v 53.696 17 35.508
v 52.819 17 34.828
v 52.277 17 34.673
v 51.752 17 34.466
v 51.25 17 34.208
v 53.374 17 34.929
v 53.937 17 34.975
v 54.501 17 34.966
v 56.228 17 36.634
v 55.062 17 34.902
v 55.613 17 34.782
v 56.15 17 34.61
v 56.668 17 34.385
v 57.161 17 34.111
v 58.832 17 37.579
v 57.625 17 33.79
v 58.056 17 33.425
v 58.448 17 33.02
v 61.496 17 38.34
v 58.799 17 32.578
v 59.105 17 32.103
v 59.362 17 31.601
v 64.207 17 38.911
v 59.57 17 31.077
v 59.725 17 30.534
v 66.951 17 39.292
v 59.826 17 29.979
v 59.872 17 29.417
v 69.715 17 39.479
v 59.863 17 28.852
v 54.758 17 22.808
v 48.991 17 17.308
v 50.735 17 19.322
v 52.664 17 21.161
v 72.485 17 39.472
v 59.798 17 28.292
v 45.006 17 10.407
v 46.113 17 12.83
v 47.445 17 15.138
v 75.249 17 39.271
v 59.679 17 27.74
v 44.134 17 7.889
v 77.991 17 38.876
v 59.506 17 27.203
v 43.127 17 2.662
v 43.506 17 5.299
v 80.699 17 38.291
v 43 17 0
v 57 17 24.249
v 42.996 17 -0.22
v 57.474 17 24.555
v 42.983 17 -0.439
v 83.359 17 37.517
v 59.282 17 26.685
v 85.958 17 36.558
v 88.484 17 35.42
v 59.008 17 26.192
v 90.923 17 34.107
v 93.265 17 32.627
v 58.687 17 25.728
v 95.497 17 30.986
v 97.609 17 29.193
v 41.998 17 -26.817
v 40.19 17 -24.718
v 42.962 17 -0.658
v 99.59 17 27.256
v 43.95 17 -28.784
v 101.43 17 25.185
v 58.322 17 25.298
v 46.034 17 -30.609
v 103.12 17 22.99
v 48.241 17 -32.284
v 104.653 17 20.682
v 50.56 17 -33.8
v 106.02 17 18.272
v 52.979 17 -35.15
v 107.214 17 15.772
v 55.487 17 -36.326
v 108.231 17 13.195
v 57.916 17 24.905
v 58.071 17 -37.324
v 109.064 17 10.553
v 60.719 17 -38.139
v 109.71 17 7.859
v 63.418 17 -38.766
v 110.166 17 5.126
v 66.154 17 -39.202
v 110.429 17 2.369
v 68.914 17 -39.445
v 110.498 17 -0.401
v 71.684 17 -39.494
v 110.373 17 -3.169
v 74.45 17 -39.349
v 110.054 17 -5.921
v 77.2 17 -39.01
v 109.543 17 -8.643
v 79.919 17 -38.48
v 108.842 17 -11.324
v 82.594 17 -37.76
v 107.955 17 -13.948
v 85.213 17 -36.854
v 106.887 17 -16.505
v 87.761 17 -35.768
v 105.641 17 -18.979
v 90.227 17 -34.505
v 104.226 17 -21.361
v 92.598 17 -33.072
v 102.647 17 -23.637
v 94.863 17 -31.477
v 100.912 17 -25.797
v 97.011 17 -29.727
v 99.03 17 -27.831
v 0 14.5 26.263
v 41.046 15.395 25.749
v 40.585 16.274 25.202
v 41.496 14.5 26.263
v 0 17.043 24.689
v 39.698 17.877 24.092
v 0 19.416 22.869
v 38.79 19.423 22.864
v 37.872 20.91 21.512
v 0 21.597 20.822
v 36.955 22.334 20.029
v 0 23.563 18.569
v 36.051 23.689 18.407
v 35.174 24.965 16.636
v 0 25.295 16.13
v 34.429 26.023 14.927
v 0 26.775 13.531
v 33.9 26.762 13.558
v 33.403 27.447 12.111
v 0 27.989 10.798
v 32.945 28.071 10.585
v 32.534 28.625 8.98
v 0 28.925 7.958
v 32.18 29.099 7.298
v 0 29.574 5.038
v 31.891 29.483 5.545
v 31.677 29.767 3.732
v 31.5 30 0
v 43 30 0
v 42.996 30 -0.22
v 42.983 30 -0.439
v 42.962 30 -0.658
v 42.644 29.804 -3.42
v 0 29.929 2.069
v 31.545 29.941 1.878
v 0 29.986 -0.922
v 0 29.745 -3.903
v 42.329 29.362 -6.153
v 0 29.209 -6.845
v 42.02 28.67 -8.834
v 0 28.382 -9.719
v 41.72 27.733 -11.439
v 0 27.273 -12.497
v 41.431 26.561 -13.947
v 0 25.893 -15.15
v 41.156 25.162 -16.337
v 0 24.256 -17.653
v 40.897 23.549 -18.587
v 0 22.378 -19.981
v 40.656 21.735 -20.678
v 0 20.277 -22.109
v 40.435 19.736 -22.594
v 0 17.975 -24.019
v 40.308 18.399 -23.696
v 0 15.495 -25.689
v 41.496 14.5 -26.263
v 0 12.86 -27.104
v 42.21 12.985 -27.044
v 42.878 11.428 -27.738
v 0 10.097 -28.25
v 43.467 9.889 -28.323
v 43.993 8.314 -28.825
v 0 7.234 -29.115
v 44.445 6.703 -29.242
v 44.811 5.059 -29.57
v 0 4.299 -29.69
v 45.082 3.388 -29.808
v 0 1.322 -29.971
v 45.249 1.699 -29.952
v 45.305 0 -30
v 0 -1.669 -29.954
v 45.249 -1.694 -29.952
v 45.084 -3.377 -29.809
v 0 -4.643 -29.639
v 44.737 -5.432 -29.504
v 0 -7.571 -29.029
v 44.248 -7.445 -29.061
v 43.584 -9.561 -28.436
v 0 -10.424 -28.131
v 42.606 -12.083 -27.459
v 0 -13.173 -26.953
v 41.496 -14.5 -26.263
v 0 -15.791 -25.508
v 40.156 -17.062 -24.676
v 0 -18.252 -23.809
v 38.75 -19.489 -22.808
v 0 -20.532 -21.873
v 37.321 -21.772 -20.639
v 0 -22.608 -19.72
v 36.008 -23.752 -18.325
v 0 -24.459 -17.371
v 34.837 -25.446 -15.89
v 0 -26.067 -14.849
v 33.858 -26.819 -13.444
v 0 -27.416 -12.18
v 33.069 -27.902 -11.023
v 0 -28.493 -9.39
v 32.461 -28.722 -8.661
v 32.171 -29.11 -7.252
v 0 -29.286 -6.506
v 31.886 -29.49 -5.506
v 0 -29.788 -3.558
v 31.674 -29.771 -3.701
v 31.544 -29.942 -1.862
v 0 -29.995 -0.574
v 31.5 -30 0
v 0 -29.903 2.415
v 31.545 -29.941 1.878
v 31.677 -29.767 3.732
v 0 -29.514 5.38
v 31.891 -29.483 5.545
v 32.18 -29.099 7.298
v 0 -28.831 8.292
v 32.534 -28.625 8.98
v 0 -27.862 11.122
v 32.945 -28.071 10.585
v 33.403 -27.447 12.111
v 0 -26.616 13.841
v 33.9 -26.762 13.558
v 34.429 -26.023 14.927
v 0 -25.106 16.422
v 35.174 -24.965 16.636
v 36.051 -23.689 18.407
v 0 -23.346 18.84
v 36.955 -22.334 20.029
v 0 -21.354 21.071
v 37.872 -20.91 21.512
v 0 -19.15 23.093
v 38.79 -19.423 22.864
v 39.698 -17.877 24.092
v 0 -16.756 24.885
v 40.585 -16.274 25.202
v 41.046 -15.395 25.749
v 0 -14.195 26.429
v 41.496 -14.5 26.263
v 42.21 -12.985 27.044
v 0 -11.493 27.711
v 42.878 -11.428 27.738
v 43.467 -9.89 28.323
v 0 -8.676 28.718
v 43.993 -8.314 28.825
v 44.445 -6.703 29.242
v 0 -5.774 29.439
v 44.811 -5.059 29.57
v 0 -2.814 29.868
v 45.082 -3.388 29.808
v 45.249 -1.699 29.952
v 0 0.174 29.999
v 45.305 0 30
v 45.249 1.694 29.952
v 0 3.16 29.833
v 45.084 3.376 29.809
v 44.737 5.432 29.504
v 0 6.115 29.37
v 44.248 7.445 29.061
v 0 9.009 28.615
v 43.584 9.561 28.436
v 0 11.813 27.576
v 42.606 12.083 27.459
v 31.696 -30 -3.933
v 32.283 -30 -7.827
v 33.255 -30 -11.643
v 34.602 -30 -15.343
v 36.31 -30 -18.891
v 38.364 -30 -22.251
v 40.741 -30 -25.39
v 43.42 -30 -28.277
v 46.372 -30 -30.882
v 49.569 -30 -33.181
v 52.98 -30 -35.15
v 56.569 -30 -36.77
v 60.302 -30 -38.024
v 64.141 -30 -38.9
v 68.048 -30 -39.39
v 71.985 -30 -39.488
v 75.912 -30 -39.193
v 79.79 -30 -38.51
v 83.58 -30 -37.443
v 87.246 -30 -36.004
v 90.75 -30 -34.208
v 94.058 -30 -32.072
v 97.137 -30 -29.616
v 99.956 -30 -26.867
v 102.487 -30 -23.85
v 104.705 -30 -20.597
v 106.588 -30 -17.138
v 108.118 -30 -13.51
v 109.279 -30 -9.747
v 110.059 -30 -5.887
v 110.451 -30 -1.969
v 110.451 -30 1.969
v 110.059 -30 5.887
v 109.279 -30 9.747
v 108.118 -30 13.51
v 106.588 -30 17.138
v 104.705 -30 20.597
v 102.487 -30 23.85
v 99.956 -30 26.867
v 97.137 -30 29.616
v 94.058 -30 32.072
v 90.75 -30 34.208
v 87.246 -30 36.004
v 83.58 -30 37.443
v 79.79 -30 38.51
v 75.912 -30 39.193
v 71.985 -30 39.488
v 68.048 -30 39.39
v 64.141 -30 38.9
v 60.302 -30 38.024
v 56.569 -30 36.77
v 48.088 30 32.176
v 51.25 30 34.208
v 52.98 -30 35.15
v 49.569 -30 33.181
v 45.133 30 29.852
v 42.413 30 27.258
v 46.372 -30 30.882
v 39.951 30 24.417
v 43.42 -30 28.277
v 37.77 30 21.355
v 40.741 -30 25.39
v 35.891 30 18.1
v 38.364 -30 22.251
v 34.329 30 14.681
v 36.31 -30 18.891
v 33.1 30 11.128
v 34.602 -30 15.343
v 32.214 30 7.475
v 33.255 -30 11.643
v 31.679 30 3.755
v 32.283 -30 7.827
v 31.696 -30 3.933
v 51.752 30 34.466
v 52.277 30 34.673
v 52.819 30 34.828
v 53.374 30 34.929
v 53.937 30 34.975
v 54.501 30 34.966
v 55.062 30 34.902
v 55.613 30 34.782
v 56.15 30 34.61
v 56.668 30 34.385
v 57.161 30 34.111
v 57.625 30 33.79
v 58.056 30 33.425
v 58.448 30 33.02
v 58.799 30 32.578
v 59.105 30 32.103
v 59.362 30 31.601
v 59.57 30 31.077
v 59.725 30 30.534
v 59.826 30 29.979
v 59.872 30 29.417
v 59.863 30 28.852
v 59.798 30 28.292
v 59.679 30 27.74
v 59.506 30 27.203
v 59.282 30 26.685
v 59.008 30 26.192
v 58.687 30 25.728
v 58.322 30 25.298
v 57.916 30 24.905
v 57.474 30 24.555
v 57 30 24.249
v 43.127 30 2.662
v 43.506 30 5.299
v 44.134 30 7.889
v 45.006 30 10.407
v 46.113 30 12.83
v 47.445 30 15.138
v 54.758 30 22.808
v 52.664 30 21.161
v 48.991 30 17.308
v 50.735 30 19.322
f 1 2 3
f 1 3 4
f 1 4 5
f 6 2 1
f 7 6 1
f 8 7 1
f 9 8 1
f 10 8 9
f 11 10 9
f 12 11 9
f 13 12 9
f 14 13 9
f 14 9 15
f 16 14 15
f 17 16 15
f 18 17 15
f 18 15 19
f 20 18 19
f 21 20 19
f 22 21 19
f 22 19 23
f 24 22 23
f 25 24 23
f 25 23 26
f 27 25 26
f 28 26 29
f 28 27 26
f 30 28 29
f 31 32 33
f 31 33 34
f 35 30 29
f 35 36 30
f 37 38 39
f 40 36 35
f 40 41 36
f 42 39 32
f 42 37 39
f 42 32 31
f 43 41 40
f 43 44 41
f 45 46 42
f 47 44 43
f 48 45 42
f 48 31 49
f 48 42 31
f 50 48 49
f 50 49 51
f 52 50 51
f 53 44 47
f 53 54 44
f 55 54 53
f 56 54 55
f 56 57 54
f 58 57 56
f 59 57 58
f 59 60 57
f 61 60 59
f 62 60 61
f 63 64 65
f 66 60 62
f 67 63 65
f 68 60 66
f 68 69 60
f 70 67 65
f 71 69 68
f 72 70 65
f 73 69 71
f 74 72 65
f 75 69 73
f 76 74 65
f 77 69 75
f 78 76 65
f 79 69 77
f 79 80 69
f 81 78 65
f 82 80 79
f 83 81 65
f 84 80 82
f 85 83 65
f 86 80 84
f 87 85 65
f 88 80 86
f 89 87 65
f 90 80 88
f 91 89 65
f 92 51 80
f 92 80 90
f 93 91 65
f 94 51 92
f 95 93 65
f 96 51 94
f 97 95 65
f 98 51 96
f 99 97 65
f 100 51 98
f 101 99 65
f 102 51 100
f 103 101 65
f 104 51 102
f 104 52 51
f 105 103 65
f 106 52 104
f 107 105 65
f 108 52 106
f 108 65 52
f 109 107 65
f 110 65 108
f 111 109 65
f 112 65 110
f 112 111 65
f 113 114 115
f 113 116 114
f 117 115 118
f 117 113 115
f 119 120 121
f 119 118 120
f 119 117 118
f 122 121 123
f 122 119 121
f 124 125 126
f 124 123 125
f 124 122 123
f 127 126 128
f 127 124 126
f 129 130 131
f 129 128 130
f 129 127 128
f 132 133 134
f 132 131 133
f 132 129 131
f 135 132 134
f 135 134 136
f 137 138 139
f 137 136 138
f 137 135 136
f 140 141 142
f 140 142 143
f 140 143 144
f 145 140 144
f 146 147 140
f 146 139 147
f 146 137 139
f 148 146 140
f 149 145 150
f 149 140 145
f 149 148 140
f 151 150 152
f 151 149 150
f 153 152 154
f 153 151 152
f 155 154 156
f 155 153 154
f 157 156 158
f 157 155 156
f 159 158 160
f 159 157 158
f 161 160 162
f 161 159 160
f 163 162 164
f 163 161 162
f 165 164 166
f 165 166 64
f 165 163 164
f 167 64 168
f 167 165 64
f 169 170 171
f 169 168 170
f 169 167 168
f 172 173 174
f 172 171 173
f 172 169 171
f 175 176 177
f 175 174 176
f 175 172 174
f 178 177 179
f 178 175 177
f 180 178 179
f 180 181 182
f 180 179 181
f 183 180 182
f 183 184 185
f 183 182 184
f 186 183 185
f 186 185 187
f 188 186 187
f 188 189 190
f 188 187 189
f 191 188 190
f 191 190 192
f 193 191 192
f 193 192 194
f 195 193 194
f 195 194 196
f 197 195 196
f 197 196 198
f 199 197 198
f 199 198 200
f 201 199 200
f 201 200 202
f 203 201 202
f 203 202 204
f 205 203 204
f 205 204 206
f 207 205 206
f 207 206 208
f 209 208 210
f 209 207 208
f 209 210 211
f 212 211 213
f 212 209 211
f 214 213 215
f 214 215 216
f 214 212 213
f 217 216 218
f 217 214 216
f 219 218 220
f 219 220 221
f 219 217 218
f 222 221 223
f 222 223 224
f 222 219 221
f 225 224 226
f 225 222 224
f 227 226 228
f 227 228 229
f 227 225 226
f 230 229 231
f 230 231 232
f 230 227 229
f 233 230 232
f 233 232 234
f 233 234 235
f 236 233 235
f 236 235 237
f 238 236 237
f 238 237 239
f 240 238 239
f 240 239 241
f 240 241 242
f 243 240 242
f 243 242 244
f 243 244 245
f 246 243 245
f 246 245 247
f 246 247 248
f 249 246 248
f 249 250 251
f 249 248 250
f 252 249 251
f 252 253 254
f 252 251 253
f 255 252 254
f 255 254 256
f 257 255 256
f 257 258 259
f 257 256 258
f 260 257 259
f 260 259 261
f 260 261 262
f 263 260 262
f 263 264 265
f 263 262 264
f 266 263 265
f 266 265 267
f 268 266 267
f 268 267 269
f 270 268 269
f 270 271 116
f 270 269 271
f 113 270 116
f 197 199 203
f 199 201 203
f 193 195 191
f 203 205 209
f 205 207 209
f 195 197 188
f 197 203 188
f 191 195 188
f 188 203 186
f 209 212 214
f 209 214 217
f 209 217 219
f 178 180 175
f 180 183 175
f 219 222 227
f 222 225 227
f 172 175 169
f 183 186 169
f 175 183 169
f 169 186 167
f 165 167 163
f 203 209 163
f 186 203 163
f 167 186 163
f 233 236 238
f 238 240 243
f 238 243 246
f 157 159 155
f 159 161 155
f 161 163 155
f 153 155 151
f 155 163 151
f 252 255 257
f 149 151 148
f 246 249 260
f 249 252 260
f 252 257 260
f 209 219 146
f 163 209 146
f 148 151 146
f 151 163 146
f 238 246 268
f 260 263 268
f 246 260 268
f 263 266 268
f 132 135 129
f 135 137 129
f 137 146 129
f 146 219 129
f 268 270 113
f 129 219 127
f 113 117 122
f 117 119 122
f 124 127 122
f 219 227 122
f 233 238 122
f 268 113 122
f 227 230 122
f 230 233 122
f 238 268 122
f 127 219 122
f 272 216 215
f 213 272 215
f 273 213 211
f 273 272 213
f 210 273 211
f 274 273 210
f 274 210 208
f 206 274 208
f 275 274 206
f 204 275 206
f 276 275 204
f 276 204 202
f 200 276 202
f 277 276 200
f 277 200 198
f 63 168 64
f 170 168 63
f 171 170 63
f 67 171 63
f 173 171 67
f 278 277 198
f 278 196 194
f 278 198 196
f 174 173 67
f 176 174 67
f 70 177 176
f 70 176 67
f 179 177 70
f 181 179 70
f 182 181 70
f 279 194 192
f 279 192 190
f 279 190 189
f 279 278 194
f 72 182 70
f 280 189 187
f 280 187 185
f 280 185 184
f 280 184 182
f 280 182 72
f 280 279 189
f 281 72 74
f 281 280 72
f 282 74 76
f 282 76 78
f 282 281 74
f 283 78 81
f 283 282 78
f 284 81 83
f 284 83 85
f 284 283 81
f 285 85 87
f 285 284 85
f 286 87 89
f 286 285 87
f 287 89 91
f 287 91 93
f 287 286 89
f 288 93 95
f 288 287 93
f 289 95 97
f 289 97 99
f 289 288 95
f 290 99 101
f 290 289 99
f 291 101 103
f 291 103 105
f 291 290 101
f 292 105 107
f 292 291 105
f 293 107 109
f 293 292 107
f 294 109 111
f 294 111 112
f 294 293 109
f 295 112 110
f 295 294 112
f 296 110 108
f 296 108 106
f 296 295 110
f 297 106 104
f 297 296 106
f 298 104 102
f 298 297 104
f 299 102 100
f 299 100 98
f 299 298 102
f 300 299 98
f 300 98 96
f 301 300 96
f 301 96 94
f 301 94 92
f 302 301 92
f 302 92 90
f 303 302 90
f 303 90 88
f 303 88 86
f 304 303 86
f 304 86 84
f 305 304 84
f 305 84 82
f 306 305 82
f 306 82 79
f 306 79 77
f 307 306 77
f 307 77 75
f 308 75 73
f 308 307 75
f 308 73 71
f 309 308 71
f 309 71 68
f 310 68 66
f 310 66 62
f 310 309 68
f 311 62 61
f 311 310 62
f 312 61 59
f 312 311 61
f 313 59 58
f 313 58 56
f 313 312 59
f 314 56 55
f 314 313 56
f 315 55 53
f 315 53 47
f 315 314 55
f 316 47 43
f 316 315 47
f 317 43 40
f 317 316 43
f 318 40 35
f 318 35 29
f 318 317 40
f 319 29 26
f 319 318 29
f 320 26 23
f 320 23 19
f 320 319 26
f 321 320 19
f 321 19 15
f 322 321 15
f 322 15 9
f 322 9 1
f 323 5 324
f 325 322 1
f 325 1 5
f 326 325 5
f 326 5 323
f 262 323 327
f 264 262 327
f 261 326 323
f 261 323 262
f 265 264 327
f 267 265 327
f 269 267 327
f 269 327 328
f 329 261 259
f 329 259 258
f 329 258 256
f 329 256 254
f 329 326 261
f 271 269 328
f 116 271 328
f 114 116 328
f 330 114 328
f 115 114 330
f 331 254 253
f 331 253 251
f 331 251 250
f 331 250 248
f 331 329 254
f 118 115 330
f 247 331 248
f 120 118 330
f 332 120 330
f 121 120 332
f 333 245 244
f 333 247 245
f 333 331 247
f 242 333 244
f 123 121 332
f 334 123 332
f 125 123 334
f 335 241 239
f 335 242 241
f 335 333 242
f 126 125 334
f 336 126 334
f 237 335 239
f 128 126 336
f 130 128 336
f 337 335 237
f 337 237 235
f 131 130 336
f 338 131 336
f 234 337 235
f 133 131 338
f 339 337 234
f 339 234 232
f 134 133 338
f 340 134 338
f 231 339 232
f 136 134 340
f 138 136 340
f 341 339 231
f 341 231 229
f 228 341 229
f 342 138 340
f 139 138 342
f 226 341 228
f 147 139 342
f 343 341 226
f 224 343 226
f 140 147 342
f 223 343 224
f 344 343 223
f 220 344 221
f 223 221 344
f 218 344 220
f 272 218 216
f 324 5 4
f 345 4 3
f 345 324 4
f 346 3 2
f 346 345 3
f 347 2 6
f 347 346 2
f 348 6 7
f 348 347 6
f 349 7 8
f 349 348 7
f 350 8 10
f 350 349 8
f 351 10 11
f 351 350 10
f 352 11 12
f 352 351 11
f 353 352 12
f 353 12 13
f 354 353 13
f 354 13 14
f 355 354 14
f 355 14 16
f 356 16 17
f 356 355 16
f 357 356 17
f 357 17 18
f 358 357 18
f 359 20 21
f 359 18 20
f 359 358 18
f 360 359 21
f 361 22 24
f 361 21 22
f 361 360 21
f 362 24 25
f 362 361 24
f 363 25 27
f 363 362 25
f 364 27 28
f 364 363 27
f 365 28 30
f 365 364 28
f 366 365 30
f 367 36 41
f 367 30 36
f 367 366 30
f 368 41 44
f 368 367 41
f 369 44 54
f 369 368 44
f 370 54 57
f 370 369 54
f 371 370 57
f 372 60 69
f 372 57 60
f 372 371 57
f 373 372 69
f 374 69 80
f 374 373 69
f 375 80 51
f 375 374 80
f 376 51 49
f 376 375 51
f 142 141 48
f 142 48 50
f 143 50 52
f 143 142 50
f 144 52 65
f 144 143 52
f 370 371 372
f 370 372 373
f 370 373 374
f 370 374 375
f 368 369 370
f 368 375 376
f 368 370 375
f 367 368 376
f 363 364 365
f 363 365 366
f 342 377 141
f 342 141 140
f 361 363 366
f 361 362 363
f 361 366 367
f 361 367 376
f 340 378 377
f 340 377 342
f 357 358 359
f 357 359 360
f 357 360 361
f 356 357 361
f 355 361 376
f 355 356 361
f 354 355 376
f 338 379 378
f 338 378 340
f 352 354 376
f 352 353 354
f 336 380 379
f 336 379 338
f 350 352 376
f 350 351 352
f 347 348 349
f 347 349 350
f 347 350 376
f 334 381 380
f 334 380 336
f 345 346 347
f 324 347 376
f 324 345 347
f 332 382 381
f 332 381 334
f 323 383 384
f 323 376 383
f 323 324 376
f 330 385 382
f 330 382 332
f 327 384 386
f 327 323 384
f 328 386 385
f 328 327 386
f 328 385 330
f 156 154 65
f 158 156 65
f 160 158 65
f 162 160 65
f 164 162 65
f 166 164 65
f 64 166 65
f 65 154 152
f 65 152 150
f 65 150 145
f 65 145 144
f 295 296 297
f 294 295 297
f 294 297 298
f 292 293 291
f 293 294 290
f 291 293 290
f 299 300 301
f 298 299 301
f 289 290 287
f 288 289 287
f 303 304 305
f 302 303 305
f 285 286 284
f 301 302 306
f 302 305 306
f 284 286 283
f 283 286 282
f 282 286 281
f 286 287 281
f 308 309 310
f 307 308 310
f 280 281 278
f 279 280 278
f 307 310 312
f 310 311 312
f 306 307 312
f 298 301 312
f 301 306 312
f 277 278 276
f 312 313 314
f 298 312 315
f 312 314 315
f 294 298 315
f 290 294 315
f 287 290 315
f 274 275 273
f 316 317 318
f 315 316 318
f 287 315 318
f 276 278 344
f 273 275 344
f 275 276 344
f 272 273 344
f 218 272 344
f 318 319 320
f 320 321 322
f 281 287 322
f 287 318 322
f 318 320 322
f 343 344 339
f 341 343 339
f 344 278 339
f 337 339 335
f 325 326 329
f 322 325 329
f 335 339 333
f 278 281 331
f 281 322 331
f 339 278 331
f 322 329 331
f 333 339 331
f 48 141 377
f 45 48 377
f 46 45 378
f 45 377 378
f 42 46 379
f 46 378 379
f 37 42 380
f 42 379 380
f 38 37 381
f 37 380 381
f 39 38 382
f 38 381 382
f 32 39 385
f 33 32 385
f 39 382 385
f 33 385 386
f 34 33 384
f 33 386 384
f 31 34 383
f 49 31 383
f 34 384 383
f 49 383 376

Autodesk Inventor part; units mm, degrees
ref_plane "YZ Plane" through (0, 0, 0) normal (1, 0, 0) x (0, 1, 0)
ref_plane "XZ Plane" through (0, 0, 0) normal (0, 1, 0) x (-1, 0, 0)
ref_plane "XY Plane" through (0, 0, 0) normal (0, 0, 1) x (1, 0, 0)
sketch "Sketch1" plane through (0, 0, 0) normal (1, 0, 0) x (0, 1, 0)
  circle A0 centre (0, 0) radius 30
  line L0 (-14.5, -26.2631) -> (-14.5, 26.2631)
  line L1 (14.5, -26.2631) -> (14.5, 26.2631)
  line L2 (0, -30) -> (0, 30) construction
  dimension "d0" = 60
  dimension "d19" = 29
extrude "Extrusion1" add sketch "Sketch1" along normal blind 71 contours A0 L1 | L0 A0
sketch "Sketch2" plane through (0, 0, 0) normal (0, 1, 0) x (-1, 0, 0)
  line L0 (-71, 26.2631) -> (-71, -26.2631) projected
  circle A0 centre (-71, 0) radius 39.5
  point P0 (0, 0)
  dimension "d3" = 79
extrude "Extrusion2" add sketch "Sketch2" along normal mid plane 60
sketch "Sketch3" plane through (0, 0, 0) normal (0, 1, 0) x (-1, 0, 0)
  circle A0 centre (-71, 0) radius 39.5 projected
  circle A1 centre (-71, 0) radius 31.5
  circle A2 centre (-71, 0) radius 39.5
  point P0 (0, 0)
  point P1 (-31.5, 0)
  point P2 (-32.9967, 10.7703)
  dimension "d12" = 79
  dimension "d13" = 63
sketch "Sketch4" plane through (71, 30, 0) normal (0, 1, 0) x (1, 0, 0)
  circle A0 centre (0, 0) radius 39.5 projected
  circle A1 centre (0, 0) radius 28
  circle A2 centre (-33.75, 0) radius 5.75
  circle A3 centre (-16.875, -29.2284) radius 5.75
  line L0 (0, 0) -> (-16.875, -29.2284) construction
  line L1 (0, 0) -> (-33.75, 0) construction
  line L2 (-23.9531, 26.2631) -> (-26.0362, 26.2631)
  line L3 (-71, 26.2631) -> (-29.5042, 26.2631) projected
  line L4 (-71, 26.2631) -> (-29.5042, 26.2631) projected
  line L5 (-29.5042, 26.2631) -> (-23.9531, 26.2631)
  point P0 (-71, 0)
  point P1 (-39.5, 0)
  point P2 (-71, 0)
  point P3 (-71, 0)
  point P4 (-28, 0)
  point P5 (-14, -24.2487)
  point P6 (-19.75, -34.208)
  point P7 (-34.3715, 23.9531)
  point P8 (-28.0594, 0.824)
  point P9 (-39.5, 0)
  point P10 (-10.7703, 38.0033)
  dimension "d20" = 56
  dimension "d21" = 60
extrude "Extrusion5" add sketch "Sketch1" along normal up to surface contours L1 A0 L0
extrude "Extrusion3" cut sketch "Sketch4" against normal blind 13 contours A0 A3 A1 A2 | A1 picked at (-5.679, -32.5969)
sketch "Sketch6" plane through (0, 30, 0) normal (0, 1, 0) x (1, 0, 0)
  arc A0 (43, 0) -> (31.5, 0) centre (37.25, 0) ccw projected
  line L0 (40.1901, 24.7184) -> (31.5, 24.7184)
  line L1 (31.5, 24.7184) -> (31.5, 0)
  circle A1 centre (71, 0) radius 39.5 projected
  line L2 (40.1901, 24.7184) -> (42.9622, 0.6581)
  arc A2 (43, 0) -> (31.5, 0) centre (37.25, 0) ccw projected
  arc A3 (43, 0) -> (57, -24.2487) centre (71, 0) ccw projected
  point P0 (0, 0)
  point P1 (42.9622, 0.6581)
  point P2 (71, -39.5)
  point P3 (32.9967, -10.7703)
  point P4 (31.5, 0)
  point P5 (31.5, 0)
extrude "Extrusion7" add sketch "Sketch6" against normal up to surface (13 mm away) contours A0 A1 L2 | L1 L0 A1 picked at (39.2874, 16.0263)
sketch "Sketch5" plane through (0, 0, 0) normal (-1, 0, 0) x (0, 0, 1)
  circle A0 centre (0, 0) radius 30 projected
  line L0 (-24.7184, 17) -> (-24.7184, 30)
  line L1 (0, 30) -> (-0.6581, 30) projected
  line L2 (-24.7184, 30) -> (0, 30)
  point P0 (34.208, 17)
  point P1 (39.5, 28)
  point P2 (-8.4816, 28.7761)
extrude "Extrusion6" cut sketch "Sketch5" against normal through all contours A0 L0 L2 L1
properties part number "hip_inventor"
